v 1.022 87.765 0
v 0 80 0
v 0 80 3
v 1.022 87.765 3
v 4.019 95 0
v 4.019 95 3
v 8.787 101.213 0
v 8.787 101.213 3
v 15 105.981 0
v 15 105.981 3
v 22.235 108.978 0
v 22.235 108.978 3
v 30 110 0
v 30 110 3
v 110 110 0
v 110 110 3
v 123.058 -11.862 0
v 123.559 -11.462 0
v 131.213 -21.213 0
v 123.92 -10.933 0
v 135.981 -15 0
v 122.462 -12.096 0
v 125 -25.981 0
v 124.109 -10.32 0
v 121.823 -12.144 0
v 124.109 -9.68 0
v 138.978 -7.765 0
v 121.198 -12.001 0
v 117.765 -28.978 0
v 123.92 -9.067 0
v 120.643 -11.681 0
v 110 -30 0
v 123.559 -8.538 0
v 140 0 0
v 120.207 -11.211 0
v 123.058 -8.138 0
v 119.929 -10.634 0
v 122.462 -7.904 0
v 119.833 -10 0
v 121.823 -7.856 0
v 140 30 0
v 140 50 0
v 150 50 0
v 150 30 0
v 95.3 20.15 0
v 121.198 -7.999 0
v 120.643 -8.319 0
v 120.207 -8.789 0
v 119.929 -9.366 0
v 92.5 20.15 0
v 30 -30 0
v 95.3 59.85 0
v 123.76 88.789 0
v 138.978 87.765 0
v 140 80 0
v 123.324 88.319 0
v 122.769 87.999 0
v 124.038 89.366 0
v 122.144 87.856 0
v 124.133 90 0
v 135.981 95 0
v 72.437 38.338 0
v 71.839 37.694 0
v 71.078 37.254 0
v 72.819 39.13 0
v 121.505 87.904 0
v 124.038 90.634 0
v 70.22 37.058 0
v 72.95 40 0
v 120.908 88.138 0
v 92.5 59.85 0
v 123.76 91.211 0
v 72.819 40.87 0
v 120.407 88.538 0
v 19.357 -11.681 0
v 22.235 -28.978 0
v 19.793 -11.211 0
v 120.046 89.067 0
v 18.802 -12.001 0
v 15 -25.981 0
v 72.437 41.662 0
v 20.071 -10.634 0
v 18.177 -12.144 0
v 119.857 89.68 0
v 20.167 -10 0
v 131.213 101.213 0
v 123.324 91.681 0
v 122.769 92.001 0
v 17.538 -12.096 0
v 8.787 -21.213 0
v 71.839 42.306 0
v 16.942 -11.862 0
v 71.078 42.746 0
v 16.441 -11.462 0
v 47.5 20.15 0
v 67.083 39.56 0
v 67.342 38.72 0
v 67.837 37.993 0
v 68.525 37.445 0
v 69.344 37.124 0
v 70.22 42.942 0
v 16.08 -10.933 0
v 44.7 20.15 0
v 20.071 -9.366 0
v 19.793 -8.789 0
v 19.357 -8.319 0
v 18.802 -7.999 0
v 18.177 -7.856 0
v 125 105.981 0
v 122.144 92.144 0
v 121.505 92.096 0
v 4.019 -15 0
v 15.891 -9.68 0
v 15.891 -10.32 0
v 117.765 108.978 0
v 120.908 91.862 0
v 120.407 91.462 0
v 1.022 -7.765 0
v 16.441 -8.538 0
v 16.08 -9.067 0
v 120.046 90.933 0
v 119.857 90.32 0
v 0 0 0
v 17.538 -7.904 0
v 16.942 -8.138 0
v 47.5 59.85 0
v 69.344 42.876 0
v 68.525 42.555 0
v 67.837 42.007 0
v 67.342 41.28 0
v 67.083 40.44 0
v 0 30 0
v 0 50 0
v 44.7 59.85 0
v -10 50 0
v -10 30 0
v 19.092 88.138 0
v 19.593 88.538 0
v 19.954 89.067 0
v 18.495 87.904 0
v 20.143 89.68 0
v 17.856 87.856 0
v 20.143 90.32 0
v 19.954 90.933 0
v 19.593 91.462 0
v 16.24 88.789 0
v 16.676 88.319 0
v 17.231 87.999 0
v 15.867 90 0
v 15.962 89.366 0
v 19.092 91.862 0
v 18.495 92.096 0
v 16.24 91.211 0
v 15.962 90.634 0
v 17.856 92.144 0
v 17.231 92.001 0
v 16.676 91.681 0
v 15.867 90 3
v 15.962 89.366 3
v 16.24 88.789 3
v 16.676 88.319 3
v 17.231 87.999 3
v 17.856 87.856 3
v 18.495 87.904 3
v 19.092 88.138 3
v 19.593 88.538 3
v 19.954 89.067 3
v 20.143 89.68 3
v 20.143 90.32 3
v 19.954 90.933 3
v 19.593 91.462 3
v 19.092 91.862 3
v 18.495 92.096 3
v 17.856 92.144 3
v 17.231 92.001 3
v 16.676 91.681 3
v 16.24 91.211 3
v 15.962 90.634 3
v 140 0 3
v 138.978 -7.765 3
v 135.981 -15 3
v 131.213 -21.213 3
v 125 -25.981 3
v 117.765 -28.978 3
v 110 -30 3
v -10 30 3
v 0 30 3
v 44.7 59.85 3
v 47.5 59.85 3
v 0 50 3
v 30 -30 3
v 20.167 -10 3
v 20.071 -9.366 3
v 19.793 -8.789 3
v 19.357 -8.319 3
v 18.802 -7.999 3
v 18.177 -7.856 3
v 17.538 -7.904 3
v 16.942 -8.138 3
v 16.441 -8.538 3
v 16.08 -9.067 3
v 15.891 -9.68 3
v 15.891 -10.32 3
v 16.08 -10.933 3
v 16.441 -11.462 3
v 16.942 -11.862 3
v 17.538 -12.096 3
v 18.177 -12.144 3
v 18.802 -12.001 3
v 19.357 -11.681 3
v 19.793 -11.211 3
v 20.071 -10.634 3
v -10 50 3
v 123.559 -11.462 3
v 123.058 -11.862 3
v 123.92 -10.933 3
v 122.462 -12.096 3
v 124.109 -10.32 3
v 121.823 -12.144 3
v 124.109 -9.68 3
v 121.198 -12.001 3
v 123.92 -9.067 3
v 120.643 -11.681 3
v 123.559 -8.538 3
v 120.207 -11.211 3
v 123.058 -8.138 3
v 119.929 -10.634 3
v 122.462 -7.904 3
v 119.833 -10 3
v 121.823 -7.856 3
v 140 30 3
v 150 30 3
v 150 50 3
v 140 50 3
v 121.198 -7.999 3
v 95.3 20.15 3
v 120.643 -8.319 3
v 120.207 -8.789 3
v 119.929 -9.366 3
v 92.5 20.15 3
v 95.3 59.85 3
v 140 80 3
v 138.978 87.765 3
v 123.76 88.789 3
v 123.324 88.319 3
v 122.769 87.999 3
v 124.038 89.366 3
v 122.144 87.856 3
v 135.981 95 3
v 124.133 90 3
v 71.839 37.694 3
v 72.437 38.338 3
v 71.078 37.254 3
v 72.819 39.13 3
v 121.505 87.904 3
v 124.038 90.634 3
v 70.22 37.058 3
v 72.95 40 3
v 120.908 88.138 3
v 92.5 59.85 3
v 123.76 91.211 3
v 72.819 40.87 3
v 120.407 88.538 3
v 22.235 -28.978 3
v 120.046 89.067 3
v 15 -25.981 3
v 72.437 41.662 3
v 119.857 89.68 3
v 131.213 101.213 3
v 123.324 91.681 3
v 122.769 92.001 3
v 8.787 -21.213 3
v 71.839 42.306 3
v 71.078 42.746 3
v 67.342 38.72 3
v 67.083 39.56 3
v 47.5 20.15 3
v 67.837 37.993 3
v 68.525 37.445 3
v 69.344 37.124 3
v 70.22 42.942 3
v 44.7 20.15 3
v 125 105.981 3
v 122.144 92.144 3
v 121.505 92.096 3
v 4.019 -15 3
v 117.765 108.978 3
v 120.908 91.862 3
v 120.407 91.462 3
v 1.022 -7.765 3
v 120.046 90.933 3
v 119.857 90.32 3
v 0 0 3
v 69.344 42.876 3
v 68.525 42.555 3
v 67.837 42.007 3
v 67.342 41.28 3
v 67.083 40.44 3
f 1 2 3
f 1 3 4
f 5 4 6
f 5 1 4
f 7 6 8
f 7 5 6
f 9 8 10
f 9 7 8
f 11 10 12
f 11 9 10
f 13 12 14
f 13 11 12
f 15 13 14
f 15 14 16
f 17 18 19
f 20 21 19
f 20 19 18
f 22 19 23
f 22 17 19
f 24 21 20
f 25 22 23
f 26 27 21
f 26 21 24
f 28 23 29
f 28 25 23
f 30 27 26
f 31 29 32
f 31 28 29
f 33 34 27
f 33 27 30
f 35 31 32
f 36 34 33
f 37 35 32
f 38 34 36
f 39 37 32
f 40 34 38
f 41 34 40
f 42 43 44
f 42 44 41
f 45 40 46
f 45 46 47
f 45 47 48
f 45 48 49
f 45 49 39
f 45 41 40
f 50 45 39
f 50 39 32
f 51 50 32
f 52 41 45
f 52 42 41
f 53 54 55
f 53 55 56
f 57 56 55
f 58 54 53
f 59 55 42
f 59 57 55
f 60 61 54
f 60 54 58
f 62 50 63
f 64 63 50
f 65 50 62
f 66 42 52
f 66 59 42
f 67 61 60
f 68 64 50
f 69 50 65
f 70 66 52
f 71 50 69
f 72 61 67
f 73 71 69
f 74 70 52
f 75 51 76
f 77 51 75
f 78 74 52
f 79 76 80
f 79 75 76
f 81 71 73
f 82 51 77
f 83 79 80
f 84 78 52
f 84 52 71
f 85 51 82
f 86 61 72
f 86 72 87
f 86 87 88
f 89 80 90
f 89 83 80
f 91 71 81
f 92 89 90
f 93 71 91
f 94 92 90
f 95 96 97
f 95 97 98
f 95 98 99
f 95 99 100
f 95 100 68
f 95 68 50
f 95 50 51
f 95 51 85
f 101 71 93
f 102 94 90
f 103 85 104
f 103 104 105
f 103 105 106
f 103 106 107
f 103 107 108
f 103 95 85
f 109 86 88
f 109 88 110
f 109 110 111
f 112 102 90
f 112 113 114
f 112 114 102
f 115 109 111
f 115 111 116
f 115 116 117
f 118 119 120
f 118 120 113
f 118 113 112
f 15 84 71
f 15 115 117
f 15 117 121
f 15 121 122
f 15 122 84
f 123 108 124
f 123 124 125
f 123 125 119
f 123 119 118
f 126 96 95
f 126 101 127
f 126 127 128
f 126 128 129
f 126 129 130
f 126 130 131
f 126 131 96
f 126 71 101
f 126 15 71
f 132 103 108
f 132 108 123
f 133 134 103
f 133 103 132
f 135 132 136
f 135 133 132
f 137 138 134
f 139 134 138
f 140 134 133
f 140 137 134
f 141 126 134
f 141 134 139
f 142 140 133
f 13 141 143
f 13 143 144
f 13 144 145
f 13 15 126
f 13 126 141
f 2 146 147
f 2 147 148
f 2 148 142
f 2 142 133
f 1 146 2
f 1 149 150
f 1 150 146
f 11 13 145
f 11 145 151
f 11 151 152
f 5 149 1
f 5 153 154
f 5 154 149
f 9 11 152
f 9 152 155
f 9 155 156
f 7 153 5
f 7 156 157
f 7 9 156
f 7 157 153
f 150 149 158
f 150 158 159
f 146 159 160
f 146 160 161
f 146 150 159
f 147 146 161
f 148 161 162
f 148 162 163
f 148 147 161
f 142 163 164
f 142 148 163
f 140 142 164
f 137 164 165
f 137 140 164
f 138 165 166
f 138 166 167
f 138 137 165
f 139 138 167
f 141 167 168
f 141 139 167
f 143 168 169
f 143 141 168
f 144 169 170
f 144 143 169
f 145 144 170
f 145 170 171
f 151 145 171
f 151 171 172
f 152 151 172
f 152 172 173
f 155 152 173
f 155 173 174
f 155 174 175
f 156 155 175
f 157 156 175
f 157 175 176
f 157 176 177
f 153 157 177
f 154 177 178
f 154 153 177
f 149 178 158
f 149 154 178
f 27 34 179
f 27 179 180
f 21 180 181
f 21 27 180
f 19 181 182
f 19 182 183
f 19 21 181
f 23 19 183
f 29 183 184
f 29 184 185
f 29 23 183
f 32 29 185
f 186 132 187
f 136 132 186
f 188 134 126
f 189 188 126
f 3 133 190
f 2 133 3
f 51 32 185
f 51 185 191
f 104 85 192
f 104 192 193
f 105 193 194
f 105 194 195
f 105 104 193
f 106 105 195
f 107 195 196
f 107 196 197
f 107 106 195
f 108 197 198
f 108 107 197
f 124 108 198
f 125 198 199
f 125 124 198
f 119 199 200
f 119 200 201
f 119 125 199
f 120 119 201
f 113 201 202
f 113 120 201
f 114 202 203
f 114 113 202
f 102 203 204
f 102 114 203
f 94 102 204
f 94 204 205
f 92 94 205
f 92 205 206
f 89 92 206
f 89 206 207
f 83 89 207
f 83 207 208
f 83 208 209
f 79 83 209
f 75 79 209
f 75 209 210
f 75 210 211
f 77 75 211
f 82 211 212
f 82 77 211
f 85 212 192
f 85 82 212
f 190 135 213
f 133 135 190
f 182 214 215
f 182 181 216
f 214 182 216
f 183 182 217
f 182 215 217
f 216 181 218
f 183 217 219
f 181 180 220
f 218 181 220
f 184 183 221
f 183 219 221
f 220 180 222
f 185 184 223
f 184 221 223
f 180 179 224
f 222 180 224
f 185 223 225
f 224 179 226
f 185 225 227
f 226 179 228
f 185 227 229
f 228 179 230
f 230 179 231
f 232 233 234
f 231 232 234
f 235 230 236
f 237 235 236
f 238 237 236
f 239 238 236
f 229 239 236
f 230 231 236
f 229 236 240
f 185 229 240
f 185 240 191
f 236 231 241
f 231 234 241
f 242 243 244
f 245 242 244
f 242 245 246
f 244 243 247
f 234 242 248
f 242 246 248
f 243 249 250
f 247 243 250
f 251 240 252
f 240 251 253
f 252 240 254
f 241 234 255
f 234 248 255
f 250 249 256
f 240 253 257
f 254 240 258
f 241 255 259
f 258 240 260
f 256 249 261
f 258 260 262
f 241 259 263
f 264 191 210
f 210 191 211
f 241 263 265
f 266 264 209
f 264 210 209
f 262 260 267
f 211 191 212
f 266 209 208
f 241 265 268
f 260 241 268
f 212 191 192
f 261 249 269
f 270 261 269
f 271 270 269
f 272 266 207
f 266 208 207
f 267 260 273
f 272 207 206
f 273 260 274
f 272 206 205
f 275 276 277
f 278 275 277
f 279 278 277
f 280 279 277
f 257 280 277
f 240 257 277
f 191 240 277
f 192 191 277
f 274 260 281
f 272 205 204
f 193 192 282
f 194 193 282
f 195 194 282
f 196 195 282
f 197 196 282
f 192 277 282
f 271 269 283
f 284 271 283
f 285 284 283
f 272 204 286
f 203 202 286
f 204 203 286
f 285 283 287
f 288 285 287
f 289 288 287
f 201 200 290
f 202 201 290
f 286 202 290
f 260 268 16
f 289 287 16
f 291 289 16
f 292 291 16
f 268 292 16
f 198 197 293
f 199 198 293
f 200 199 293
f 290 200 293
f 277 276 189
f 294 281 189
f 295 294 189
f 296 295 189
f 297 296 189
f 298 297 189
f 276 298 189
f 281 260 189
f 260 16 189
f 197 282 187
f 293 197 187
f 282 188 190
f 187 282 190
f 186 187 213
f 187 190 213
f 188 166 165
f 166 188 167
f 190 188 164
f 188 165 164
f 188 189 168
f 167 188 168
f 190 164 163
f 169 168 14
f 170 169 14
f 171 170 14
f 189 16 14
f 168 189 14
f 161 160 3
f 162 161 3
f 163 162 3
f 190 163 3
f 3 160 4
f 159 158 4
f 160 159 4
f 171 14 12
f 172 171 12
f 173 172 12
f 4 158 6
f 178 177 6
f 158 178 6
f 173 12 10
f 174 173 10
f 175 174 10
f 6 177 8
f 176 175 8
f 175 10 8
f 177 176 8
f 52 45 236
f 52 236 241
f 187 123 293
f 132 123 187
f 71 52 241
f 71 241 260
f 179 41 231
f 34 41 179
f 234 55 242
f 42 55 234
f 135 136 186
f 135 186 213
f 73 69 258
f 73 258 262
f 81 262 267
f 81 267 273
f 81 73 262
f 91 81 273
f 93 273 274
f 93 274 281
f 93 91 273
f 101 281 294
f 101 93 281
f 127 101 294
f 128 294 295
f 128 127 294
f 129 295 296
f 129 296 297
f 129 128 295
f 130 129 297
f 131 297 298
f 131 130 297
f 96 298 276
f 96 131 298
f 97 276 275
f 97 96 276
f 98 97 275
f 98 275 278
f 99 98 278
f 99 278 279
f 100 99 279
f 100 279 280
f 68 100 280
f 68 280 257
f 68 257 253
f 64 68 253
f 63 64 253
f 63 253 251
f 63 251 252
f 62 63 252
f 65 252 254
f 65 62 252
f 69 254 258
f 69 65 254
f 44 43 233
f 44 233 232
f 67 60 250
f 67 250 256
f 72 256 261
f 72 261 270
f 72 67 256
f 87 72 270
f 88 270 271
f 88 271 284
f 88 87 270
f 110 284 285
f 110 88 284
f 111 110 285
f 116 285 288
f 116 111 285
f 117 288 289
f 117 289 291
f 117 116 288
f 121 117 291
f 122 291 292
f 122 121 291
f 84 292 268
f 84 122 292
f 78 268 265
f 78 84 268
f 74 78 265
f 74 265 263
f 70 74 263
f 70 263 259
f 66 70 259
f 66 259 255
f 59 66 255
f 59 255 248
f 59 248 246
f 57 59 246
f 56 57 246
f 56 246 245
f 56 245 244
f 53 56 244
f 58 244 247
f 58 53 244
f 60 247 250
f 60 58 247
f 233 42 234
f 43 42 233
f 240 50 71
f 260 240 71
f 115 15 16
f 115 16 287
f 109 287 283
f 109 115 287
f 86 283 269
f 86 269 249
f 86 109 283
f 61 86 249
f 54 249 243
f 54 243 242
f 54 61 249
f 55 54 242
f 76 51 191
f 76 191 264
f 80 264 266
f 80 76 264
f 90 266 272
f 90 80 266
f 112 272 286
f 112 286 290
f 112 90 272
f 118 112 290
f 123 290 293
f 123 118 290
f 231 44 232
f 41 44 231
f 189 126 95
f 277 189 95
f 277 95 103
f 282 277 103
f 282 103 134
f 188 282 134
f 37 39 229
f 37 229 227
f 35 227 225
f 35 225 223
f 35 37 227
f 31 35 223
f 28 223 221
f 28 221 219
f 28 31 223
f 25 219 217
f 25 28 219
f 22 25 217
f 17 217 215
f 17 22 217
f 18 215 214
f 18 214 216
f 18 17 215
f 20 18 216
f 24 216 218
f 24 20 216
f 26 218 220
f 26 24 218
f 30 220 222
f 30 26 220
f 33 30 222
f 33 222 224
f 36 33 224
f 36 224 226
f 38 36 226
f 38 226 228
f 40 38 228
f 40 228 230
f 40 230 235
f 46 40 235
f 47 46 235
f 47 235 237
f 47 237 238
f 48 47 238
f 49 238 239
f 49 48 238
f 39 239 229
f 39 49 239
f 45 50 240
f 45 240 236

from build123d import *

# Parameters (mm, degrees)
CROQUIS2_R              = 2.95
CROQUIS2_R_2            = 2.15
SALIENTE_EXTRUIR2_DEPTH = 3


with BuildPart() as part:
    # Croquis2 → Saliente-Extruir2 (new body)
    with BuildSketch(Plane.XY):
        with BuildLine():
            Line((30, 110), (110, 110))
            ThreePointArc((110, 110), (131.213203436, 101.213203436), (140, 80))
            Line((140, 80), (140, 50))
            Line((140, 50), (150, 50))
            Line((150, 50), (150, 40))
            Line((150, 40), (150, 30))
            Line((150, 30), (140, 30))
            Line((140, 30), (140, 0))
            ThreePointArc((140, 0), (131.213203436, -21.213203436), (110, -30))
            Line((110, -30), (30, -30))
            ThreePointArc((30, -30), (8.786796564, -21.213203436), (0, 0))
            Line((0, 0), (0, 30))
            Line((0, 30), (-10, 30))
            Line((-10, 30), (-10, 40))
            Line((-10, 40), (-10, 50))
            Line((-10, 50), (0, 50))
            Line((0, 50), (0, 80))
            ThreePointArc((0, 80), (8.786796564, 101.213203436), (30, 110))
        make_face()
        with Locations((70, 40)):
            Circle(CROQUIS2_R, mode=Mode.SUBTRACT)
        with Locations((18.016709675, -10)):
            Circle(CROQUIS2_R_2, mode=Mode.SUBTRACT)
        with Locations(Location((18.016709675, 90, 0), (0, 0, 180))):
            Circle(CROQUIS2_R_2, mode=Mode.SUBTRACT)
        with Locations(Location((121.983290325, -10, 0), (0, 0, 180))):
            Circle(CROQUIS2_R_2, mode=Mode.SUBTRACT)
        with Locations((121.983290325, 90)):
            Circle(CROQUIS2_R_2, mode=Mode.SUBTRACT)
        Polygon((44.7, 59.85), (47.5, 59.85), (47.5, 40), (47.5, 20.15), (44.7, 20.15), align=None, mode=Mode.SUBTRACT)
        Polygon((92.5, 59.85), (92.5, 40), (92.5, 20.15), (95.3, 20.15), (95.3, 59.85), align=None, mode=Mode.SUBTRACT)
    extrude(amount=SALIENTE_EXTRUIR2_DEPTH)


solid = part.part
